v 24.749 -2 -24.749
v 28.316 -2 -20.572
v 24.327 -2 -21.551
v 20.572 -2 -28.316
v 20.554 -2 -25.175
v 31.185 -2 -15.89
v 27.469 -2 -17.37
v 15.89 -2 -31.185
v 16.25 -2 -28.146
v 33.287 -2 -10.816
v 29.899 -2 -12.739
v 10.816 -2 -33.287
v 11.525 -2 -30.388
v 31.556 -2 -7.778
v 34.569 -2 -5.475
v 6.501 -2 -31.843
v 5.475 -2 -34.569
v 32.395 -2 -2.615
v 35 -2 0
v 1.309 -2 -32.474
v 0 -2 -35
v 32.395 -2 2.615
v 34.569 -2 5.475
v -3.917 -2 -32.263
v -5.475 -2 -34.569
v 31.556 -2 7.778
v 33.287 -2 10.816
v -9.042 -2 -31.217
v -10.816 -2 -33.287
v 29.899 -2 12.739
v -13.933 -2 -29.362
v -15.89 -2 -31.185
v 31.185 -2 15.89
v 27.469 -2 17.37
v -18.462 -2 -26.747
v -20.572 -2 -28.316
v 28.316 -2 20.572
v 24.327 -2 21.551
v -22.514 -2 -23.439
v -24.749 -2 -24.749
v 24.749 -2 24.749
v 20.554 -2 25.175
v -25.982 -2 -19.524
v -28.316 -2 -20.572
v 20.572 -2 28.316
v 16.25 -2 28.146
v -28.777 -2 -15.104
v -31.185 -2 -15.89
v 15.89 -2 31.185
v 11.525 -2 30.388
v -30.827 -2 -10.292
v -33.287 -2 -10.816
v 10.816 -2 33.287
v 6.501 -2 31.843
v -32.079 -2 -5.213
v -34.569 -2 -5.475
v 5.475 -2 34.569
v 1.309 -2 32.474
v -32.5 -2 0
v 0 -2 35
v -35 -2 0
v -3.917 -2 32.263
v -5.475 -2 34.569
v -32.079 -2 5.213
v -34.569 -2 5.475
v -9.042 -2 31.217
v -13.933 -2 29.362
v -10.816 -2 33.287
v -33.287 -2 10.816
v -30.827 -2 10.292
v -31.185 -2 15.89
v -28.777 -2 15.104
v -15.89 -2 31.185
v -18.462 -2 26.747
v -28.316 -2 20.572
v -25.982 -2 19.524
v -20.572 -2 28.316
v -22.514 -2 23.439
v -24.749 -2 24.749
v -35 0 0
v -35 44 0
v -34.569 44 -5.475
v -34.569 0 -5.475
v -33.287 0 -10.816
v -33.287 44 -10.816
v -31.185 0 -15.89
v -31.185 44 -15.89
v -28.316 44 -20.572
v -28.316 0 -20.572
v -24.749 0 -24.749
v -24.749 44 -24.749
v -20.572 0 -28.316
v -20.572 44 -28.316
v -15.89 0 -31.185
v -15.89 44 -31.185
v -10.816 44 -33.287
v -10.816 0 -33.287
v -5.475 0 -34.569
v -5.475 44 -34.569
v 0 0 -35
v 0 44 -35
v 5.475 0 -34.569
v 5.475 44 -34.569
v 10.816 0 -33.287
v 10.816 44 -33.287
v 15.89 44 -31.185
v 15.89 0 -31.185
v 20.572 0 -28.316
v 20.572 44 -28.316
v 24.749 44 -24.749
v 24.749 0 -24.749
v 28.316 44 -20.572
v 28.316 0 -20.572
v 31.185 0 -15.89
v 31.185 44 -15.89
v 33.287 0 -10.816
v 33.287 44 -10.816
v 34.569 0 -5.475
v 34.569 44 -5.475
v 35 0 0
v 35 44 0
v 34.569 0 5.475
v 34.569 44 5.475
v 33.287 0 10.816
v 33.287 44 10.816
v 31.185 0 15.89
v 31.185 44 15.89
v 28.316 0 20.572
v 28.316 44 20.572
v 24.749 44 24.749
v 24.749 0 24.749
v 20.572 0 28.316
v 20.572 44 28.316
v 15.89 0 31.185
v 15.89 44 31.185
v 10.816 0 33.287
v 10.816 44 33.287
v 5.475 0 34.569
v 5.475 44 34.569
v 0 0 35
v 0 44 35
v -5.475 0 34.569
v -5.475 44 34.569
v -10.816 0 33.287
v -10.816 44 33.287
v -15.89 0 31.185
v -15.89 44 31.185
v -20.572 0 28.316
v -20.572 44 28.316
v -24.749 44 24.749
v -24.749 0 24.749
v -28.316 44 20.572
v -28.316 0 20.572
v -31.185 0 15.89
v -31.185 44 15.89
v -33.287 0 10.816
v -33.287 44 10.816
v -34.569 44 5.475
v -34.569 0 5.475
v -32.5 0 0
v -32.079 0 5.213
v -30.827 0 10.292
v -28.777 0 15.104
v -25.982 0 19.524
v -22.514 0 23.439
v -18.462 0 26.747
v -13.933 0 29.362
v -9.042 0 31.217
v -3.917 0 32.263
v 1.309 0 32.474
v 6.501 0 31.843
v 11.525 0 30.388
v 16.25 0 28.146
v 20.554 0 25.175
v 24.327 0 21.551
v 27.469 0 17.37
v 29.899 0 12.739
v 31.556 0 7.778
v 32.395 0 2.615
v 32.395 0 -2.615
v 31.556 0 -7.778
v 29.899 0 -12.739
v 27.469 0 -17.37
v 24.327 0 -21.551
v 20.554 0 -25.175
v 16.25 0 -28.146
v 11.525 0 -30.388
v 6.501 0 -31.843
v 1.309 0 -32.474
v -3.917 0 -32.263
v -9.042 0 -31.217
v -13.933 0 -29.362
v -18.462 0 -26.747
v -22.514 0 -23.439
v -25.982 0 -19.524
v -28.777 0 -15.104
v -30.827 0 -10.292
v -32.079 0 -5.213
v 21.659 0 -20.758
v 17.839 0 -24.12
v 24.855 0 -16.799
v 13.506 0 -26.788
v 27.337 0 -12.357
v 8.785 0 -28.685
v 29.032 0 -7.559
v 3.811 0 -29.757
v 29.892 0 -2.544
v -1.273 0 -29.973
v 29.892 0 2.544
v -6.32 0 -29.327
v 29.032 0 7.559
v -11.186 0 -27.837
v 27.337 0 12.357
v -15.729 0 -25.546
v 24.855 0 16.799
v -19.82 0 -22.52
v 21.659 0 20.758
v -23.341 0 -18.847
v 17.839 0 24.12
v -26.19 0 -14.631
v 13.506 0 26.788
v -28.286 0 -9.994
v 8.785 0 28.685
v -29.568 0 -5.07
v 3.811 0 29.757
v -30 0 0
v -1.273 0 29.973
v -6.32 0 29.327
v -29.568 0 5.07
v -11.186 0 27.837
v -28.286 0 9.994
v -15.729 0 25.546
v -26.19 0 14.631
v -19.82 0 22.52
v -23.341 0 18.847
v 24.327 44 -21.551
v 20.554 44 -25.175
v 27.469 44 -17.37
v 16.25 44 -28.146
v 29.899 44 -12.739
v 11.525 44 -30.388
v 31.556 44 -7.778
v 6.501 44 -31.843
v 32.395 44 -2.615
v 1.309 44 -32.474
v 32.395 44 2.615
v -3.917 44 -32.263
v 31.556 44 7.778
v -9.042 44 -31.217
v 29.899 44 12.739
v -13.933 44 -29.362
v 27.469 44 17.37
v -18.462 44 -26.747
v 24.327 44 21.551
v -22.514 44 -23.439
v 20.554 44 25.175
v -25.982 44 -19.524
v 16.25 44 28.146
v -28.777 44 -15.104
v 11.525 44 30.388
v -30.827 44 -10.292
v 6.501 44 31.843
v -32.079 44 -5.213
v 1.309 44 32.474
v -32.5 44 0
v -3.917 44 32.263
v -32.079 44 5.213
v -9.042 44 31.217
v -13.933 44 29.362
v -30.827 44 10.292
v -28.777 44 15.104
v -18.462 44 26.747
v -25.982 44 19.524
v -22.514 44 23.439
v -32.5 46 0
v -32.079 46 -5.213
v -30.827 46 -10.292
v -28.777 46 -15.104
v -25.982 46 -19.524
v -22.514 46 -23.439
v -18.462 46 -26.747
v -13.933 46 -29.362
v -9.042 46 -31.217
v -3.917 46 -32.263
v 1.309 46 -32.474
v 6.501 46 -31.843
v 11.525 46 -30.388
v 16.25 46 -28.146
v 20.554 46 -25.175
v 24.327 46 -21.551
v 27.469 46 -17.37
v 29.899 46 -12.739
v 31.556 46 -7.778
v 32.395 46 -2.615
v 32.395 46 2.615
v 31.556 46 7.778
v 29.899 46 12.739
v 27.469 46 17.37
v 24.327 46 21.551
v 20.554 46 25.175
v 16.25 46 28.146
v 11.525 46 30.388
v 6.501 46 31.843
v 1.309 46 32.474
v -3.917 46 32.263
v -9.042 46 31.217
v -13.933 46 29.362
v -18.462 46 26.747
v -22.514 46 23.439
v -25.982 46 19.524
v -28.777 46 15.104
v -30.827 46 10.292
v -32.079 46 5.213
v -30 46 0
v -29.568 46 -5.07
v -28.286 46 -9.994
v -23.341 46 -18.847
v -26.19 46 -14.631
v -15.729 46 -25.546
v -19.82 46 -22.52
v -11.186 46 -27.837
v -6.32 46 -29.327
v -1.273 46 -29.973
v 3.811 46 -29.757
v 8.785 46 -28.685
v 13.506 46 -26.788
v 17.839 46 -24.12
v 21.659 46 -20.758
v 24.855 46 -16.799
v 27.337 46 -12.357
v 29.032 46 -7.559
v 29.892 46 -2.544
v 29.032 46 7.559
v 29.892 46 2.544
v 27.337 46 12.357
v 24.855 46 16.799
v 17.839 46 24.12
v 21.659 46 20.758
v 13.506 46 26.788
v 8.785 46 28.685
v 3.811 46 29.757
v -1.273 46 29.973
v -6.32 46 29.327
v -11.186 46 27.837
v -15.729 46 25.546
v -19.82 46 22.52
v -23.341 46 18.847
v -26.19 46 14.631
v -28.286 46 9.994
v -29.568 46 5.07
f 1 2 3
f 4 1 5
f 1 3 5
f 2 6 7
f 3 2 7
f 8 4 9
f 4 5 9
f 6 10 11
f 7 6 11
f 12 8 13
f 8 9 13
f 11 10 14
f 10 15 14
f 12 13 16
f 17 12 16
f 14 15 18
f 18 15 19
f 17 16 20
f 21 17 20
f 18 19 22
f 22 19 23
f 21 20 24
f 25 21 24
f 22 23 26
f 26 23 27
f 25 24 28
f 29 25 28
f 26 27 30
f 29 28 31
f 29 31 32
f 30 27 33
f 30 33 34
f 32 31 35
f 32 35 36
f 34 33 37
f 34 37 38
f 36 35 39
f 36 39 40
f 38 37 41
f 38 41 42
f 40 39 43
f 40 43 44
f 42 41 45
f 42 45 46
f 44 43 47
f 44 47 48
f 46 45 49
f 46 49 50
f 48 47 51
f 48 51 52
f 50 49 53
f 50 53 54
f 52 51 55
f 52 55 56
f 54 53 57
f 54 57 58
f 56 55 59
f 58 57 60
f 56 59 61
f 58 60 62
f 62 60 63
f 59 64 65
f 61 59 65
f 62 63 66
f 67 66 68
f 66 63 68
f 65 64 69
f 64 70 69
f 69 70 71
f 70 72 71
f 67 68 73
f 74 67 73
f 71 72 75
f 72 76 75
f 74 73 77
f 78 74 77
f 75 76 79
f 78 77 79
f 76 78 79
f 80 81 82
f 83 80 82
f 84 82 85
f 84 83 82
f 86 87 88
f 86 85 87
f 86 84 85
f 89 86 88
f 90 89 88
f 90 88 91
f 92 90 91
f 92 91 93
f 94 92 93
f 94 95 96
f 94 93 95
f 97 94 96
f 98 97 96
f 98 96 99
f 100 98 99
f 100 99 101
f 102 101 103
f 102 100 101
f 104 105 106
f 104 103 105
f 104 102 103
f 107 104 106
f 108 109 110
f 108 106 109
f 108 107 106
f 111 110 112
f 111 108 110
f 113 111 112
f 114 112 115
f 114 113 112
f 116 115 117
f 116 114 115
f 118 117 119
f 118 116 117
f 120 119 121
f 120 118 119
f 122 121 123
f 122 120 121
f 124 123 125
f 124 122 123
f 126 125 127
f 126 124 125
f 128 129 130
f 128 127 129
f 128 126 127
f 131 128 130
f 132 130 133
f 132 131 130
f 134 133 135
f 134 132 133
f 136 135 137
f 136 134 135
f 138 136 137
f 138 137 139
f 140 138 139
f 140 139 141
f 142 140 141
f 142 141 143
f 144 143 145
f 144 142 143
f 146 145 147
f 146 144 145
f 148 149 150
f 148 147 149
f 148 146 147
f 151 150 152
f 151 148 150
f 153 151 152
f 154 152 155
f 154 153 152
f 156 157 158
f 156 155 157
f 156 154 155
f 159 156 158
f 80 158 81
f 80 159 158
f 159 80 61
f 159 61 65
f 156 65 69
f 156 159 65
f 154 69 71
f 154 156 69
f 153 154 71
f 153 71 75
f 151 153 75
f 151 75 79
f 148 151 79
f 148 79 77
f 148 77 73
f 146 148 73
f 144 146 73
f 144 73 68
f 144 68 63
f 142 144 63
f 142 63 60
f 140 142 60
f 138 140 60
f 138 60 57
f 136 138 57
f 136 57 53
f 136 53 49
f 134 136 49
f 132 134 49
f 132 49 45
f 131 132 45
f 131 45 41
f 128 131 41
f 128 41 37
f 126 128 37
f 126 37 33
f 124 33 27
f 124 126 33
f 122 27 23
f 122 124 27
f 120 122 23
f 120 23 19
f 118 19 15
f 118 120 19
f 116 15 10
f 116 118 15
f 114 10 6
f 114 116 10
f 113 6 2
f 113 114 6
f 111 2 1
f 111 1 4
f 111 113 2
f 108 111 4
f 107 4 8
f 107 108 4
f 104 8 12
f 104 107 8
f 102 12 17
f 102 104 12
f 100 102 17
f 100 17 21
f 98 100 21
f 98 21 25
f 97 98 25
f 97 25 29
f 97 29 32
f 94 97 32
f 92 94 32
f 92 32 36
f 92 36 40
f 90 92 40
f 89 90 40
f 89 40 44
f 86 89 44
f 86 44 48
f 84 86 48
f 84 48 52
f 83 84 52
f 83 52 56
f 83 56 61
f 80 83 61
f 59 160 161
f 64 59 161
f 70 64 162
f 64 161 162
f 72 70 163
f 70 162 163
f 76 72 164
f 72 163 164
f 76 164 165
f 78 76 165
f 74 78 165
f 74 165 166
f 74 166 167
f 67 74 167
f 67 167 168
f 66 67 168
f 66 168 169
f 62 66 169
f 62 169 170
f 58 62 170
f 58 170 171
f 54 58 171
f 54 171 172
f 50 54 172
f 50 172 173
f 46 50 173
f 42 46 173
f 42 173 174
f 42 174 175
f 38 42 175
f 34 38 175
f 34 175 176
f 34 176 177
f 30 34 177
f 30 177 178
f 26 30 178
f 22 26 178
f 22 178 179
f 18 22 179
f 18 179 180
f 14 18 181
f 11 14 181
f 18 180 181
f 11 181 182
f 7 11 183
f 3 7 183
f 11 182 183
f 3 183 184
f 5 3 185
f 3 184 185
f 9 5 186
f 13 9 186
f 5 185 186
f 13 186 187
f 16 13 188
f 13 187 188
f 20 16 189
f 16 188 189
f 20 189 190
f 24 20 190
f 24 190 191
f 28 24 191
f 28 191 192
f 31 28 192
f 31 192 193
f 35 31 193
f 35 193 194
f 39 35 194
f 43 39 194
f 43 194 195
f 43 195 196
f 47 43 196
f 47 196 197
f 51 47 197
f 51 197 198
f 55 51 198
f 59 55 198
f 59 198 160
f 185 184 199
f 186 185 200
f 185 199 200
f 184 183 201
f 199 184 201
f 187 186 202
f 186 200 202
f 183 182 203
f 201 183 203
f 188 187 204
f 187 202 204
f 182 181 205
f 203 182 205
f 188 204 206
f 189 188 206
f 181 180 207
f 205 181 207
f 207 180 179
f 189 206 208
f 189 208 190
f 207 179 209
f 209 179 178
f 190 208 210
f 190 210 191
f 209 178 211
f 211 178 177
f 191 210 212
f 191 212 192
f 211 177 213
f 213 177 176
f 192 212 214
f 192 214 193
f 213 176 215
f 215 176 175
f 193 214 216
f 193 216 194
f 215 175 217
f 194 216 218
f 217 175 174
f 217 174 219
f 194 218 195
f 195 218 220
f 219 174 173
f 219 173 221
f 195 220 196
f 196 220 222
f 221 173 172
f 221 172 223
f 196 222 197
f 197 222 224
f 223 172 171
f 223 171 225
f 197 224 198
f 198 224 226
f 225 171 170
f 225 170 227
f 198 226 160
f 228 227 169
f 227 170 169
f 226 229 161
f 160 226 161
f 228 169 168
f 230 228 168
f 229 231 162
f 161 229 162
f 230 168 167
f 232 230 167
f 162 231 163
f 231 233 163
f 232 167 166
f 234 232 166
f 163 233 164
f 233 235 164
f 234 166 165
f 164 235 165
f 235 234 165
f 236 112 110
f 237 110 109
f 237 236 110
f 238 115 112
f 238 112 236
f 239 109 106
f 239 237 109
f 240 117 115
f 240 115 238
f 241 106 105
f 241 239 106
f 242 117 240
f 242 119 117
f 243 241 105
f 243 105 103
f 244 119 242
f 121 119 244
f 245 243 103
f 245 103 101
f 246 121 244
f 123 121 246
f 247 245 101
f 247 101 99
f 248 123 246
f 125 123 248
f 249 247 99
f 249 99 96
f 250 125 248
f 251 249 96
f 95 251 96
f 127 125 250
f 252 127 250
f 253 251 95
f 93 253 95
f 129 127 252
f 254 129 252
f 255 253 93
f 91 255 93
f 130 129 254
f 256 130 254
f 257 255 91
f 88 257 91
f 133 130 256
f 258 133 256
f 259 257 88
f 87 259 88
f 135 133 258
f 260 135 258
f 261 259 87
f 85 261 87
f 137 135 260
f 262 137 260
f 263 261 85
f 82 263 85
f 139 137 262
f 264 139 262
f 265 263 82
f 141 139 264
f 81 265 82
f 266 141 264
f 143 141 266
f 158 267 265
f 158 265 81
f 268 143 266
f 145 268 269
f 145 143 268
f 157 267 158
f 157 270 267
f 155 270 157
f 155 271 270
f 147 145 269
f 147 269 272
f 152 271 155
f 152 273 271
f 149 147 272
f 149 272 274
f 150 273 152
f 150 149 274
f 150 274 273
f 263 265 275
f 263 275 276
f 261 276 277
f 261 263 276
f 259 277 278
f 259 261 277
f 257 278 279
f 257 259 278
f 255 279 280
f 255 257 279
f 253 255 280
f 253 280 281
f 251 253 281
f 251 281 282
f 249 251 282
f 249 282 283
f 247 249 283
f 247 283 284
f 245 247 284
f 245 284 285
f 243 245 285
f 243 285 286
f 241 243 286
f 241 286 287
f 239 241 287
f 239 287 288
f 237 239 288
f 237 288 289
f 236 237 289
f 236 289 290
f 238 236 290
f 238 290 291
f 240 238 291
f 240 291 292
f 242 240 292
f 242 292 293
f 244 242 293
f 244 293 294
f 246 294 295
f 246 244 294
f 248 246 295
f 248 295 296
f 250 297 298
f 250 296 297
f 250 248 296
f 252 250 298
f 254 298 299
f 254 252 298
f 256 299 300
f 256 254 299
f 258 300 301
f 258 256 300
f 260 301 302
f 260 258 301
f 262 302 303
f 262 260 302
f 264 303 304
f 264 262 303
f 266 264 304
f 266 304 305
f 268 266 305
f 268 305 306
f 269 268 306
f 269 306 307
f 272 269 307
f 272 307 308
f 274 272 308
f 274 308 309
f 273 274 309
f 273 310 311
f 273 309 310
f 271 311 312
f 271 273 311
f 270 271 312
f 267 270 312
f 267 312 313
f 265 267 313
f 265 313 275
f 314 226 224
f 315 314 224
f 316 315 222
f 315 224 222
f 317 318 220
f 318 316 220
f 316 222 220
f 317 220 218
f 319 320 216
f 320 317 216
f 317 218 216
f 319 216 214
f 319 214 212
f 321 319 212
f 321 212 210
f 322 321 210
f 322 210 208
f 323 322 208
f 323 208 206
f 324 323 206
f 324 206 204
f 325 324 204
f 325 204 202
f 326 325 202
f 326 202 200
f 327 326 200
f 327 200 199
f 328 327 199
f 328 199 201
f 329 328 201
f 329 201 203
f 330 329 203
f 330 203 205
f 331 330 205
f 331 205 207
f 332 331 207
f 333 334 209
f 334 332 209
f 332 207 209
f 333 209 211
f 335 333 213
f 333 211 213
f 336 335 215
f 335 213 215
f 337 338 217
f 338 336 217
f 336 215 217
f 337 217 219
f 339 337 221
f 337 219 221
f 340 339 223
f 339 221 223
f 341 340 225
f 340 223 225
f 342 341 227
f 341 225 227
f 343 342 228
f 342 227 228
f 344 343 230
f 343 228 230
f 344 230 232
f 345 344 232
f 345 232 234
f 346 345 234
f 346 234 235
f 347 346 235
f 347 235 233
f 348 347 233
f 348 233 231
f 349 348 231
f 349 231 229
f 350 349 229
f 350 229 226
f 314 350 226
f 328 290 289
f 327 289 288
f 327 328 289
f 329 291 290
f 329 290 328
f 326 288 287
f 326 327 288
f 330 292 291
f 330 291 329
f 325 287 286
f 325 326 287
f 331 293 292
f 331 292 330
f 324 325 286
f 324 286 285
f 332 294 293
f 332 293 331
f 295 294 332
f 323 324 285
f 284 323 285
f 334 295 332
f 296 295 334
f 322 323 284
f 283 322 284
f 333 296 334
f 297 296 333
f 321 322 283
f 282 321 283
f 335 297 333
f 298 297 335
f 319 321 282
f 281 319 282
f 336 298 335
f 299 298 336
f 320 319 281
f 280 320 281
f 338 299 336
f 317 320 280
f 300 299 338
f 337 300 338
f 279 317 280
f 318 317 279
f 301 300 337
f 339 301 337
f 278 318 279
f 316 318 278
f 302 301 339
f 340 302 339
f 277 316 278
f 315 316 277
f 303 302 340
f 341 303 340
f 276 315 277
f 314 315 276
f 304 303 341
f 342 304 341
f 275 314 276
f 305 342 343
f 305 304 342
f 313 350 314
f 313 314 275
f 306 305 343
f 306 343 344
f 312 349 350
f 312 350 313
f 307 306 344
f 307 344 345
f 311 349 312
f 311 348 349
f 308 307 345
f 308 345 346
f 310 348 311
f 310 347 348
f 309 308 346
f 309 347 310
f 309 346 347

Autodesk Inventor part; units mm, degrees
ref_plane "YZ Plane" through (0, 0, 0) normal (1, 0, 0) x (0, 1, 0)
ref_plane "XZ Plane" through (0, 0, 0) normal (0, 1, 0) x (-1, 0, 0)
ref_plane "XY Plane" through (0, 0, 0) normal (0, 0, 1) x (1, 0, 0)
sketch "Sketch1" plane through (0, 0, 0) normal (0, 1, 0) x (-1, 0, 0)
  circle A0 centre (0, 0) radius 30
  circle A1 centre (0, 0) radius 32.5
  circle A2 centre (0, 0) radius 35
  dimension "d0" = 60
  dimension "d1" = 65
  dimension "d2" = 70
extrude "Extrusion1" add sketch "Sketch1" along normal blind 46 contours A1
extrude "Extrusion2" add sketch "Sketch1" along normal blind 44 and the other way blind 2 contours A2
properties part number "electronicschamber" material "ABS Plastic"
